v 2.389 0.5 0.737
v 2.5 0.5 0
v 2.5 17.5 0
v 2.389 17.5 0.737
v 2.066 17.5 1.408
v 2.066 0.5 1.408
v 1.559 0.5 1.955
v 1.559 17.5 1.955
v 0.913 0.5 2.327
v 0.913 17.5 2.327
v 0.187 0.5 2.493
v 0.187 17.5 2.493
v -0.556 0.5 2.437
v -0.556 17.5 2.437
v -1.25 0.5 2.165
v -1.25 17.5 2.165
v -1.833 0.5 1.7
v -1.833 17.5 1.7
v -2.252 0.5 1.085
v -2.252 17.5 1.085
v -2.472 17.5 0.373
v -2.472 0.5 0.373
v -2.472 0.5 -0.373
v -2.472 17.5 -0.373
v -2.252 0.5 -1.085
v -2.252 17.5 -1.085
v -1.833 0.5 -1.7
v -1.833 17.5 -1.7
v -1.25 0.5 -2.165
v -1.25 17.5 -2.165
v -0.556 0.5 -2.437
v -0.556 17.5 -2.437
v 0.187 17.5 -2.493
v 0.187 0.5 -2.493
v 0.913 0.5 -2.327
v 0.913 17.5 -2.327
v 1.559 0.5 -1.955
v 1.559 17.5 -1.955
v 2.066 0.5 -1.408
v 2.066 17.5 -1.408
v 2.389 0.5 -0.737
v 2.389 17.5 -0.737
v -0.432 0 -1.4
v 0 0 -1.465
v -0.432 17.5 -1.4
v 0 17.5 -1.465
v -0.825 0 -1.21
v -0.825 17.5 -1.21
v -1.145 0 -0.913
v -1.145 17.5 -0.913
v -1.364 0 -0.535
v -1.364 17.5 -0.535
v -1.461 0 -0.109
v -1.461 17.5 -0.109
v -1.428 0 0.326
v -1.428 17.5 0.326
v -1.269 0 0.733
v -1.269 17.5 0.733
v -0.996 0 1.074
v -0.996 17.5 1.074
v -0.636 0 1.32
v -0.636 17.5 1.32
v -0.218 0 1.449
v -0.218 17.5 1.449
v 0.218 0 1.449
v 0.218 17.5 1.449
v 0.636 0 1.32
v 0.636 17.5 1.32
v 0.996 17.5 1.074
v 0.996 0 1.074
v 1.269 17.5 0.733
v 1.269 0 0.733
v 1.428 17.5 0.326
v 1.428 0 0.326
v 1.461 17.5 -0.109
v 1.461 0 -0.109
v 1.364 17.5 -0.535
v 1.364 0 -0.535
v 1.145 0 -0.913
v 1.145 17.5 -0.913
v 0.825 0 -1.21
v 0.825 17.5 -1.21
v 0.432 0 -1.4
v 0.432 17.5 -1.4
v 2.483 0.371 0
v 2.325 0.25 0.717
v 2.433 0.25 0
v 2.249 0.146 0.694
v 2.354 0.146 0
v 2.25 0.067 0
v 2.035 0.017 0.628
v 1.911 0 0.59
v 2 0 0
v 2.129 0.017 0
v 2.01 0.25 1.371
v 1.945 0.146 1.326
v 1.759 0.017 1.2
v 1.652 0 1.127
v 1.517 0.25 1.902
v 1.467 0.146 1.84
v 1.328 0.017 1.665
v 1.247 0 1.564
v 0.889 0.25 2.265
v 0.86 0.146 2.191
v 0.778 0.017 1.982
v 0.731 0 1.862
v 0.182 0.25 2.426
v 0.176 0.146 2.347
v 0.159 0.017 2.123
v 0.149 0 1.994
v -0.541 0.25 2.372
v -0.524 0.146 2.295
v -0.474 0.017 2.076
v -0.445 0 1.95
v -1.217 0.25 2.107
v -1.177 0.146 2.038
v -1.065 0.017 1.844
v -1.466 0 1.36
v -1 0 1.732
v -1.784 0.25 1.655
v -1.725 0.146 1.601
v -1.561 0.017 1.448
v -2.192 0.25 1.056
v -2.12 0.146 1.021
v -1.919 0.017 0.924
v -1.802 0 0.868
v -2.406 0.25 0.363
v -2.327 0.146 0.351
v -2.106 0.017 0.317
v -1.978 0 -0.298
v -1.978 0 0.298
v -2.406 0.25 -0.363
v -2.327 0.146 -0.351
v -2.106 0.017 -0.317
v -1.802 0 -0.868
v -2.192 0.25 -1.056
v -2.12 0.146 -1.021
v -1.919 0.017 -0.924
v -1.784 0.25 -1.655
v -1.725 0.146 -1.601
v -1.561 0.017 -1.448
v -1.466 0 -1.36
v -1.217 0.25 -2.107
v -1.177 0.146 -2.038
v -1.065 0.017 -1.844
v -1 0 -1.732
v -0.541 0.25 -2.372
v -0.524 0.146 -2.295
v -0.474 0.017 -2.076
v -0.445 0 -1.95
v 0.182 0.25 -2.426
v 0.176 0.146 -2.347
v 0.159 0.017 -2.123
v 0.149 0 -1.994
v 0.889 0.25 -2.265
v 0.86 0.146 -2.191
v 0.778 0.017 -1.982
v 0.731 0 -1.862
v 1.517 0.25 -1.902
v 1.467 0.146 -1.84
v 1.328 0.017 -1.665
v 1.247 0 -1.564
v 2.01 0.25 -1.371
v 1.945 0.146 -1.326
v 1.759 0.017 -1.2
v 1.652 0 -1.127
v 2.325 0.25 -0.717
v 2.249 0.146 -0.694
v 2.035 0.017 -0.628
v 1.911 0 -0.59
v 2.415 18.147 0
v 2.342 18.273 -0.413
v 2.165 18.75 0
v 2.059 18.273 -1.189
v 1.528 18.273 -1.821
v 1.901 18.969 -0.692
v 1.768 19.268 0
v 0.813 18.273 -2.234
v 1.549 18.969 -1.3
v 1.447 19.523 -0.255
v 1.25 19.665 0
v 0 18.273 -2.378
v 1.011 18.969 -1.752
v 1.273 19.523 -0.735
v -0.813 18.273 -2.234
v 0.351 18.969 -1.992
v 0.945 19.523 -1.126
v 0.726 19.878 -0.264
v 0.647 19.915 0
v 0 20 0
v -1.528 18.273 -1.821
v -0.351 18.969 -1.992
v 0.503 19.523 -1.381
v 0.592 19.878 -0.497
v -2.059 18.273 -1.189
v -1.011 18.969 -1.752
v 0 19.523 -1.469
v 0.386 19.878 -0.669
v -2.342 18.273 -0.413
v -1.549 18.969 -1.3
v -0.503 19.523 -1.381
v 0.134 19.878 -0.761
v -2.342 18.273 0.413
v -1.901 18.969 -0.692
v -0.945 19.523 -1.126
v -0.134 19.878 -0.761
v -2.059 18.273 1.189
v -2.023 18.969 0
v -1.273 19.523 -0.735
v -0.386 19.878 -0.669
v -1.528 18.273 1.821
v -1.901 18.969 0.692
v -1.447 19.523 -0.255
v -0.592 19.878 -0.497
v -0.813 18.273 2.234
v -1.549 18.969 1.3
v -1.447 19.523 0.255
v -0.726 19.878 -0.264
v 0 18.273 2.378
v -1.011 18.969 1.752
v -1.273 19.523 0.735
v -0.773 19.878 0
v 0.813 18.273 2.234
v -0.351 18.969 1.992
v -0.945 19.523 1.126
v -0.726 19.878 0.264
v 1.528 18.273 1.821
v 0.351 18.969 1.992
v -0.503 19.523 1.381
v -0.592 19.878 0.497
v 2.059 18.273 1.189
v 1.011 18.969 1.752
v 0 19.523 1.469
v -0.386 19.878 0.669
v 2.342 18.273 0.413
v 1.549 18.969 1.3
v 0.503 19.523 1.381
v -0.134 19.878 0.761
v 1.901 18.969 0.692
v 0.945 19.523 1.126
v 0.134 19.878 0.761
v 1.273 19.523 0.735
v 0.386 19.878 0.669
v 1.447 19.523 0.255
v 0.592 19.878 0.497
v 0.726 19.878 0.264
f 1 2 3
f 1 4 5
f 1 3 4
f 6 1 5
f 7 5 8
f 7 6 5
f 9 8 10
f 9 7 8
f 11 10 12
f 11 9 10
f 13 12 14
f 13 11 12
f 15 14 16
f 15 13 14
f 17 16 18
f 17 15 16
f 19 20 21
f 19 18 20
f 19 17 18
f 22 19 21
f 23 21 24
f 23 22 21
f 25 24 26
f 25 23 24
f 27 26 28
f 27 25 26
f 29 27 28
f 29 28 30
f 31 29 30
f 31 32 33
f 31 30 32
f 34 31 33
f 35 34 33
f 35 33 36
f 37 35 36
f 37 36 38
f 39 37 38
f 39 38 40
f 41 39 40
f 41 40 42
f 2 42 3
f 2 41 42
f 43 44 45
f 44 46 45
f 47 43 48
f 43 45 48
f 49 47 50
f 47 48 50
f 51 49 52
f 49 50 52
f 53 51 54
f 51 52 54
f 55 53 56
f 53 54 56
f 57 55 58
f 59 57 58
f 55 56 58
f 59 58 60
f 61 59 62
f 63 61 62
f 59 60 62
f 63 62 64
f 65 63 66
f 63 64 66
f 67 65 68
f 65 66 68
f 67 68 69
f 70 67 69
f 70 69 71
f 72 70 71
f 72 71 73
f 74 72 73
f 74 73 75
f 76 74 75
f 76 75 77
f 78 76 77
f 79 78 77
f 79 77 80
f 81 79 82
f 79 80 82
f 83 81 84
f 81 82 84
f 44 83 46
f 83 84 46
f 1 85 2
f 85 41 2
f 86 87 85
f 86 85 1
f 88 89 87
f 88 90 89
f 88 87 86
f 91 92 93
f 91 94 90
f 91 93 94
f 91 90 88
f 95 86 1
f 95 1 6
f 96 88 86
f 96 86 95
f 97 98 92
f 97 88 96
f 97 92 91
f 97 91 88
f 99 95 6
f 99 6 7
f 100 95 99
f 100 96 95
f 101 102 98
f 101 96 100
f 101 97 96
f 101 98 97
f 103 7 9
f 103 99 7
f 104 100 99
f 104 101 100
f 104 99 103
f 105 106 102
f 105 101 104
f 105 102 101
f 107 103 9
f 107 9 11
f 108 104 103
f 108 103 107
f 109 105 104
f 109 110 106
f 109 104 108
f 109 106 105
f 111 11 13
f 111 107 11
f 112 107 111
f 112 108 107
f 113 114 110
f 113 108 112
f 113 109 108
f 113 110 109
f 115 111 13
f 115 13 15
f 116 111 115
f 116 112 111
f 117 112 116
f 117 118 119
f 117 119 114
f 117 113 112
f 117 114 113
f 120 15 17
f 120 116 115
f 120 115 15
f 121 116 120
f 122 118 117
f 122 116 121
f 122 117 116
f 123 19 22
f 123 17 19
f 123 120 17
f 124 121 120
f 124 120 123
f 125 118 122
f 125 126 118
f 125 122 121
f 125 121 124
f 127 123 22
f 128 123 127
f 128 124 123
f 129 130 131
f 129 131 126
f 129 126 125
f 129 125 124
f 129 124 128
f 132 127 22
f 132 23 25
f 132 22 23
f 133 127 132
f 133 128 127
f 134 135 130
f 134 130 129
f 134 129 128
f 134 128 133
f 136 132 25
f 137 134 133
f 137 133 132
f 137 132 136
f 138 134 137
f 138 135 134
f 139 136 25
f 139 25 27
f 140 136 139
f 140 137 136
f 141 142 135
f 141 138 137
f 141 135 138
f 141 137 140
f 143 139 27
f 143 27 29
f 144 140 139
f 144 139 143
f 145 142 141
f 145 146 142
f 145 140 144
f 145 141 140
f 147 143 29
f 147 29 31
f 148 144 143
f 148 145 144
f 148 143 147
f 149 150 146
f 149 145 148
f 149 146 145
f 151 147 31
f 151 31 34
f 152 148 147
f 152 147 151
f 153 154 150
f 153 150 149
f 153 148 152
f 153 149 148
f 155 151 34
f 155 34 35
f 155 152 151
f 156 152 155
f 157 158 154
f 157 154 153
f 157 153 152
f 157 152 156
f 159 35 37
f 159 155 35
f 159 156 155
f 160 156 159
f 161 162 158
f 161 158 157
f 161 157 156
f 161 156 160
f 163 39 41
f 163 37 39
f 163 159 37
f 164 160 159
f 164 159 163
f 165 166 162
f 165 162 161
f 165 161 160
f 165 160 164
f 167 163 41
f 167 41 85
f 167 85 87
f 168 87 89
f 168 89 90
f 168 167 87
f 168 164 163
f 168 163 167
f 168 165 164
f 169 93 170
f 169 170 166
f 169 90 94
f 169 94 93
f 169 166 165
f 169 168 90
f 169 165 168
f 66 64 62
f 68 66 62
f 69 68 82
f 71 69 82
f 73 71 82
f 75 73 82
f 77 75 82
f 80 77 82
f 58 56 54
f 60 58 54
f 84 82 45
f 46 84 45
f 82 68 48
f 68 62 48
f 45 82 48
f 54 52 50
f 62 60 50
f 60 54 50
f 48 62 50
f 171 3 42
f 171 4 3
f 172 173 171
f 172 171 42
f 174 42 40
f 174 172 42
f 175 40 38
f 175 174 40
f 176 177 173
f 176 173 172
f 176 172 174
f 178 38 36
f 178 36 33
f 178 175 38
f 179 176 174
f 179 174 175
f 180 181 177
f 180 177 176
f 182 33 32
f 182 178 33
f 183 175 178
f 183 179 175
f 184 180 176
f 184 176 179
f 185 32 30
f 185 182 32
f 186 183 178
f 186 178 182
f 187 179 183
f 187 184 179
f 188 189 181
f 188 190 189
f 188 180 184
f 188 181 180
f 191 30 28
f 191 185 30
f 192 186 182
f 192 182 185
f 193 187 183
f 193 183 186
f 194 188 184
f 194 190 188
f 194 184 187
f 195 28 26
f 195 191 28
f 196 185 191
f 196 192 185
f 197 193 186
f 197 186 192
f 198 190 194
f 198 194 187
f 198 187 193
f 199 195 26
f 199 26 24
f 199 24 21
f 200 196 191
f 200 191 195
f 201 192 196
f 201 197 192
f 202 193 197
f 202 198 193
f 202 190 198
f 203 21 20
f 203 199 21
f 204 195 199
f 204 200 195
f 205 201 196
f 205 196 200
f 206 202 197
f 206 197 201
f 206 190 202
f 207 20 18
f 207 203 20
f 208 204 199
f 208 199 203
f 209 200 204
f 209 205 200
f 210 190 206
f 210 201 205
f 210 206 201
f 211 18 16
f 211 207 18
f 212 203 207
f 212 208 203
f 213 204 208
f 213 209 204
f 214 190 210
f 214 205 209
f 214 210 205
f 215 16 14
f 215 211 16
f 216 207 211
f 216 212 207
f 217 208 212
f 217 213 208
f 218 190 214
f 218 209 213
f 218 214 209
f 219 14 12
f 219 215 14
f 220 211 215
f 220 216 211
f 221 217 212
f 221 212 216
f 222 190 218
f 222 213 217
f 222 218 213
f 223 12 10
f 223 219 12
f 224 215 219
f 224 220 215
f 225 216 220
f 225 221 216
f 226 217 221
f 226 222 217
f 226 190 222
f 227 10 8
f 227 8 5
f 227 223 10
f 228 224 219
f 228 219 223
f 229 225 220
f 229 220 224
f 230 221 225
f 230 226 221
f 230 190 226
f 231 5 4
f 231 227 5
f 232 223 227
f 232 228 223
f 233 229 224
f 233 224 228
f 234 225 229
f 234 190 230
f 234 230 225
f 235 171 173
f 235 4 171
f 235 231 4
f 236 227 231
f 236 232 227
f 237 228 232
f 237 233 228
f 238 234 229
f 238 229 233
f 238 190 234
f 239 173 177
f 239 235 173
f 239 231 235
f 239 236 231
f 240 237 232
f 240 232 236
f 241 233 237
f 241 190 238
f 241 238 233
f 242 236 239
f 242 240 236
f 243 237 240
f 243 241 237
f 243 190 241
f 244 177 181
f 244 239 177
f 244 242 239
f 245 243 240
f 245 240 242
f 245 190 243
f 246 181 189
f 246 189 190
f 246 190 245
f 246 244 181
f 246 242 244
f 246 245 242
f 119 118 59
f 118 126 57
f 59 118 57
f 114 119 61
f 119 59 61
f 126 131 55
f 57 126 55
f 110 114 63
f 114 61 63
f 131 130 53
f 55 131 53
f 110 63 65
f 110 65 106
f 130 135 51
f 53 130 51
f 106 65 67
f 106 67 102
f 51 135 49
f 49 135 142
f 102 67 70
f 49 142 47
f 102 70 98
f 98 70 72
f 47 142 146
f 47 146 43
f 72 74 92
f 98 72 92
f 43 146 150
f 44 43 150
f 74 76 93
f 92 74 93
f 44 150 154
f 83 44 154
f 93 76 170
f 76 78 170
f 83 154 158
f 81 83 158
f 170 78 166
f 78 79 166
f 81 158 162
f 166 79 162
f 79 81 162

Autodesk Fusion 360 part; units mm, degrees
sketch "Sketch1" plane through (0, 0, 0) normal (0, 1, 0) x (1, 0, 0)
  circle A0 centre (0, 0) radius 2.5
  dimension "d1" = 5
extrude "Extrude1" add sketch "Sketch1" along normal blind 20
sketch "Sketch2" plane through (0, 0, 0) normal (0, 0, 1) x (1, 0, 0)
  line L0 (0, 0) -> (0, 15)
  line L1 (0, 15) -> (0, 17.5)
  dimension "d4" = 15
  dimension "d5" = 2.5
fillet "Fillet1" radius 2.5 1 faces at (-0.8863, 20, -0.2321)
sketch "Sketch3" plane through (0, 0, 0) normal (0, -1, 0) x (1, 0, 0)
  circle A0 centre (0, 0) radius 2.5
  circle A1 centre (0, 0) radius 1.5
  dimension "d8" = 3
hole "Hole1" at (0, 0, 0) direction (0, 1, 0) diameter 2.93 depth 17.5 tip angle 180
fillet "Fillet2" radius 0.5 1 edges at (-2.3308, 0, 0.904)
